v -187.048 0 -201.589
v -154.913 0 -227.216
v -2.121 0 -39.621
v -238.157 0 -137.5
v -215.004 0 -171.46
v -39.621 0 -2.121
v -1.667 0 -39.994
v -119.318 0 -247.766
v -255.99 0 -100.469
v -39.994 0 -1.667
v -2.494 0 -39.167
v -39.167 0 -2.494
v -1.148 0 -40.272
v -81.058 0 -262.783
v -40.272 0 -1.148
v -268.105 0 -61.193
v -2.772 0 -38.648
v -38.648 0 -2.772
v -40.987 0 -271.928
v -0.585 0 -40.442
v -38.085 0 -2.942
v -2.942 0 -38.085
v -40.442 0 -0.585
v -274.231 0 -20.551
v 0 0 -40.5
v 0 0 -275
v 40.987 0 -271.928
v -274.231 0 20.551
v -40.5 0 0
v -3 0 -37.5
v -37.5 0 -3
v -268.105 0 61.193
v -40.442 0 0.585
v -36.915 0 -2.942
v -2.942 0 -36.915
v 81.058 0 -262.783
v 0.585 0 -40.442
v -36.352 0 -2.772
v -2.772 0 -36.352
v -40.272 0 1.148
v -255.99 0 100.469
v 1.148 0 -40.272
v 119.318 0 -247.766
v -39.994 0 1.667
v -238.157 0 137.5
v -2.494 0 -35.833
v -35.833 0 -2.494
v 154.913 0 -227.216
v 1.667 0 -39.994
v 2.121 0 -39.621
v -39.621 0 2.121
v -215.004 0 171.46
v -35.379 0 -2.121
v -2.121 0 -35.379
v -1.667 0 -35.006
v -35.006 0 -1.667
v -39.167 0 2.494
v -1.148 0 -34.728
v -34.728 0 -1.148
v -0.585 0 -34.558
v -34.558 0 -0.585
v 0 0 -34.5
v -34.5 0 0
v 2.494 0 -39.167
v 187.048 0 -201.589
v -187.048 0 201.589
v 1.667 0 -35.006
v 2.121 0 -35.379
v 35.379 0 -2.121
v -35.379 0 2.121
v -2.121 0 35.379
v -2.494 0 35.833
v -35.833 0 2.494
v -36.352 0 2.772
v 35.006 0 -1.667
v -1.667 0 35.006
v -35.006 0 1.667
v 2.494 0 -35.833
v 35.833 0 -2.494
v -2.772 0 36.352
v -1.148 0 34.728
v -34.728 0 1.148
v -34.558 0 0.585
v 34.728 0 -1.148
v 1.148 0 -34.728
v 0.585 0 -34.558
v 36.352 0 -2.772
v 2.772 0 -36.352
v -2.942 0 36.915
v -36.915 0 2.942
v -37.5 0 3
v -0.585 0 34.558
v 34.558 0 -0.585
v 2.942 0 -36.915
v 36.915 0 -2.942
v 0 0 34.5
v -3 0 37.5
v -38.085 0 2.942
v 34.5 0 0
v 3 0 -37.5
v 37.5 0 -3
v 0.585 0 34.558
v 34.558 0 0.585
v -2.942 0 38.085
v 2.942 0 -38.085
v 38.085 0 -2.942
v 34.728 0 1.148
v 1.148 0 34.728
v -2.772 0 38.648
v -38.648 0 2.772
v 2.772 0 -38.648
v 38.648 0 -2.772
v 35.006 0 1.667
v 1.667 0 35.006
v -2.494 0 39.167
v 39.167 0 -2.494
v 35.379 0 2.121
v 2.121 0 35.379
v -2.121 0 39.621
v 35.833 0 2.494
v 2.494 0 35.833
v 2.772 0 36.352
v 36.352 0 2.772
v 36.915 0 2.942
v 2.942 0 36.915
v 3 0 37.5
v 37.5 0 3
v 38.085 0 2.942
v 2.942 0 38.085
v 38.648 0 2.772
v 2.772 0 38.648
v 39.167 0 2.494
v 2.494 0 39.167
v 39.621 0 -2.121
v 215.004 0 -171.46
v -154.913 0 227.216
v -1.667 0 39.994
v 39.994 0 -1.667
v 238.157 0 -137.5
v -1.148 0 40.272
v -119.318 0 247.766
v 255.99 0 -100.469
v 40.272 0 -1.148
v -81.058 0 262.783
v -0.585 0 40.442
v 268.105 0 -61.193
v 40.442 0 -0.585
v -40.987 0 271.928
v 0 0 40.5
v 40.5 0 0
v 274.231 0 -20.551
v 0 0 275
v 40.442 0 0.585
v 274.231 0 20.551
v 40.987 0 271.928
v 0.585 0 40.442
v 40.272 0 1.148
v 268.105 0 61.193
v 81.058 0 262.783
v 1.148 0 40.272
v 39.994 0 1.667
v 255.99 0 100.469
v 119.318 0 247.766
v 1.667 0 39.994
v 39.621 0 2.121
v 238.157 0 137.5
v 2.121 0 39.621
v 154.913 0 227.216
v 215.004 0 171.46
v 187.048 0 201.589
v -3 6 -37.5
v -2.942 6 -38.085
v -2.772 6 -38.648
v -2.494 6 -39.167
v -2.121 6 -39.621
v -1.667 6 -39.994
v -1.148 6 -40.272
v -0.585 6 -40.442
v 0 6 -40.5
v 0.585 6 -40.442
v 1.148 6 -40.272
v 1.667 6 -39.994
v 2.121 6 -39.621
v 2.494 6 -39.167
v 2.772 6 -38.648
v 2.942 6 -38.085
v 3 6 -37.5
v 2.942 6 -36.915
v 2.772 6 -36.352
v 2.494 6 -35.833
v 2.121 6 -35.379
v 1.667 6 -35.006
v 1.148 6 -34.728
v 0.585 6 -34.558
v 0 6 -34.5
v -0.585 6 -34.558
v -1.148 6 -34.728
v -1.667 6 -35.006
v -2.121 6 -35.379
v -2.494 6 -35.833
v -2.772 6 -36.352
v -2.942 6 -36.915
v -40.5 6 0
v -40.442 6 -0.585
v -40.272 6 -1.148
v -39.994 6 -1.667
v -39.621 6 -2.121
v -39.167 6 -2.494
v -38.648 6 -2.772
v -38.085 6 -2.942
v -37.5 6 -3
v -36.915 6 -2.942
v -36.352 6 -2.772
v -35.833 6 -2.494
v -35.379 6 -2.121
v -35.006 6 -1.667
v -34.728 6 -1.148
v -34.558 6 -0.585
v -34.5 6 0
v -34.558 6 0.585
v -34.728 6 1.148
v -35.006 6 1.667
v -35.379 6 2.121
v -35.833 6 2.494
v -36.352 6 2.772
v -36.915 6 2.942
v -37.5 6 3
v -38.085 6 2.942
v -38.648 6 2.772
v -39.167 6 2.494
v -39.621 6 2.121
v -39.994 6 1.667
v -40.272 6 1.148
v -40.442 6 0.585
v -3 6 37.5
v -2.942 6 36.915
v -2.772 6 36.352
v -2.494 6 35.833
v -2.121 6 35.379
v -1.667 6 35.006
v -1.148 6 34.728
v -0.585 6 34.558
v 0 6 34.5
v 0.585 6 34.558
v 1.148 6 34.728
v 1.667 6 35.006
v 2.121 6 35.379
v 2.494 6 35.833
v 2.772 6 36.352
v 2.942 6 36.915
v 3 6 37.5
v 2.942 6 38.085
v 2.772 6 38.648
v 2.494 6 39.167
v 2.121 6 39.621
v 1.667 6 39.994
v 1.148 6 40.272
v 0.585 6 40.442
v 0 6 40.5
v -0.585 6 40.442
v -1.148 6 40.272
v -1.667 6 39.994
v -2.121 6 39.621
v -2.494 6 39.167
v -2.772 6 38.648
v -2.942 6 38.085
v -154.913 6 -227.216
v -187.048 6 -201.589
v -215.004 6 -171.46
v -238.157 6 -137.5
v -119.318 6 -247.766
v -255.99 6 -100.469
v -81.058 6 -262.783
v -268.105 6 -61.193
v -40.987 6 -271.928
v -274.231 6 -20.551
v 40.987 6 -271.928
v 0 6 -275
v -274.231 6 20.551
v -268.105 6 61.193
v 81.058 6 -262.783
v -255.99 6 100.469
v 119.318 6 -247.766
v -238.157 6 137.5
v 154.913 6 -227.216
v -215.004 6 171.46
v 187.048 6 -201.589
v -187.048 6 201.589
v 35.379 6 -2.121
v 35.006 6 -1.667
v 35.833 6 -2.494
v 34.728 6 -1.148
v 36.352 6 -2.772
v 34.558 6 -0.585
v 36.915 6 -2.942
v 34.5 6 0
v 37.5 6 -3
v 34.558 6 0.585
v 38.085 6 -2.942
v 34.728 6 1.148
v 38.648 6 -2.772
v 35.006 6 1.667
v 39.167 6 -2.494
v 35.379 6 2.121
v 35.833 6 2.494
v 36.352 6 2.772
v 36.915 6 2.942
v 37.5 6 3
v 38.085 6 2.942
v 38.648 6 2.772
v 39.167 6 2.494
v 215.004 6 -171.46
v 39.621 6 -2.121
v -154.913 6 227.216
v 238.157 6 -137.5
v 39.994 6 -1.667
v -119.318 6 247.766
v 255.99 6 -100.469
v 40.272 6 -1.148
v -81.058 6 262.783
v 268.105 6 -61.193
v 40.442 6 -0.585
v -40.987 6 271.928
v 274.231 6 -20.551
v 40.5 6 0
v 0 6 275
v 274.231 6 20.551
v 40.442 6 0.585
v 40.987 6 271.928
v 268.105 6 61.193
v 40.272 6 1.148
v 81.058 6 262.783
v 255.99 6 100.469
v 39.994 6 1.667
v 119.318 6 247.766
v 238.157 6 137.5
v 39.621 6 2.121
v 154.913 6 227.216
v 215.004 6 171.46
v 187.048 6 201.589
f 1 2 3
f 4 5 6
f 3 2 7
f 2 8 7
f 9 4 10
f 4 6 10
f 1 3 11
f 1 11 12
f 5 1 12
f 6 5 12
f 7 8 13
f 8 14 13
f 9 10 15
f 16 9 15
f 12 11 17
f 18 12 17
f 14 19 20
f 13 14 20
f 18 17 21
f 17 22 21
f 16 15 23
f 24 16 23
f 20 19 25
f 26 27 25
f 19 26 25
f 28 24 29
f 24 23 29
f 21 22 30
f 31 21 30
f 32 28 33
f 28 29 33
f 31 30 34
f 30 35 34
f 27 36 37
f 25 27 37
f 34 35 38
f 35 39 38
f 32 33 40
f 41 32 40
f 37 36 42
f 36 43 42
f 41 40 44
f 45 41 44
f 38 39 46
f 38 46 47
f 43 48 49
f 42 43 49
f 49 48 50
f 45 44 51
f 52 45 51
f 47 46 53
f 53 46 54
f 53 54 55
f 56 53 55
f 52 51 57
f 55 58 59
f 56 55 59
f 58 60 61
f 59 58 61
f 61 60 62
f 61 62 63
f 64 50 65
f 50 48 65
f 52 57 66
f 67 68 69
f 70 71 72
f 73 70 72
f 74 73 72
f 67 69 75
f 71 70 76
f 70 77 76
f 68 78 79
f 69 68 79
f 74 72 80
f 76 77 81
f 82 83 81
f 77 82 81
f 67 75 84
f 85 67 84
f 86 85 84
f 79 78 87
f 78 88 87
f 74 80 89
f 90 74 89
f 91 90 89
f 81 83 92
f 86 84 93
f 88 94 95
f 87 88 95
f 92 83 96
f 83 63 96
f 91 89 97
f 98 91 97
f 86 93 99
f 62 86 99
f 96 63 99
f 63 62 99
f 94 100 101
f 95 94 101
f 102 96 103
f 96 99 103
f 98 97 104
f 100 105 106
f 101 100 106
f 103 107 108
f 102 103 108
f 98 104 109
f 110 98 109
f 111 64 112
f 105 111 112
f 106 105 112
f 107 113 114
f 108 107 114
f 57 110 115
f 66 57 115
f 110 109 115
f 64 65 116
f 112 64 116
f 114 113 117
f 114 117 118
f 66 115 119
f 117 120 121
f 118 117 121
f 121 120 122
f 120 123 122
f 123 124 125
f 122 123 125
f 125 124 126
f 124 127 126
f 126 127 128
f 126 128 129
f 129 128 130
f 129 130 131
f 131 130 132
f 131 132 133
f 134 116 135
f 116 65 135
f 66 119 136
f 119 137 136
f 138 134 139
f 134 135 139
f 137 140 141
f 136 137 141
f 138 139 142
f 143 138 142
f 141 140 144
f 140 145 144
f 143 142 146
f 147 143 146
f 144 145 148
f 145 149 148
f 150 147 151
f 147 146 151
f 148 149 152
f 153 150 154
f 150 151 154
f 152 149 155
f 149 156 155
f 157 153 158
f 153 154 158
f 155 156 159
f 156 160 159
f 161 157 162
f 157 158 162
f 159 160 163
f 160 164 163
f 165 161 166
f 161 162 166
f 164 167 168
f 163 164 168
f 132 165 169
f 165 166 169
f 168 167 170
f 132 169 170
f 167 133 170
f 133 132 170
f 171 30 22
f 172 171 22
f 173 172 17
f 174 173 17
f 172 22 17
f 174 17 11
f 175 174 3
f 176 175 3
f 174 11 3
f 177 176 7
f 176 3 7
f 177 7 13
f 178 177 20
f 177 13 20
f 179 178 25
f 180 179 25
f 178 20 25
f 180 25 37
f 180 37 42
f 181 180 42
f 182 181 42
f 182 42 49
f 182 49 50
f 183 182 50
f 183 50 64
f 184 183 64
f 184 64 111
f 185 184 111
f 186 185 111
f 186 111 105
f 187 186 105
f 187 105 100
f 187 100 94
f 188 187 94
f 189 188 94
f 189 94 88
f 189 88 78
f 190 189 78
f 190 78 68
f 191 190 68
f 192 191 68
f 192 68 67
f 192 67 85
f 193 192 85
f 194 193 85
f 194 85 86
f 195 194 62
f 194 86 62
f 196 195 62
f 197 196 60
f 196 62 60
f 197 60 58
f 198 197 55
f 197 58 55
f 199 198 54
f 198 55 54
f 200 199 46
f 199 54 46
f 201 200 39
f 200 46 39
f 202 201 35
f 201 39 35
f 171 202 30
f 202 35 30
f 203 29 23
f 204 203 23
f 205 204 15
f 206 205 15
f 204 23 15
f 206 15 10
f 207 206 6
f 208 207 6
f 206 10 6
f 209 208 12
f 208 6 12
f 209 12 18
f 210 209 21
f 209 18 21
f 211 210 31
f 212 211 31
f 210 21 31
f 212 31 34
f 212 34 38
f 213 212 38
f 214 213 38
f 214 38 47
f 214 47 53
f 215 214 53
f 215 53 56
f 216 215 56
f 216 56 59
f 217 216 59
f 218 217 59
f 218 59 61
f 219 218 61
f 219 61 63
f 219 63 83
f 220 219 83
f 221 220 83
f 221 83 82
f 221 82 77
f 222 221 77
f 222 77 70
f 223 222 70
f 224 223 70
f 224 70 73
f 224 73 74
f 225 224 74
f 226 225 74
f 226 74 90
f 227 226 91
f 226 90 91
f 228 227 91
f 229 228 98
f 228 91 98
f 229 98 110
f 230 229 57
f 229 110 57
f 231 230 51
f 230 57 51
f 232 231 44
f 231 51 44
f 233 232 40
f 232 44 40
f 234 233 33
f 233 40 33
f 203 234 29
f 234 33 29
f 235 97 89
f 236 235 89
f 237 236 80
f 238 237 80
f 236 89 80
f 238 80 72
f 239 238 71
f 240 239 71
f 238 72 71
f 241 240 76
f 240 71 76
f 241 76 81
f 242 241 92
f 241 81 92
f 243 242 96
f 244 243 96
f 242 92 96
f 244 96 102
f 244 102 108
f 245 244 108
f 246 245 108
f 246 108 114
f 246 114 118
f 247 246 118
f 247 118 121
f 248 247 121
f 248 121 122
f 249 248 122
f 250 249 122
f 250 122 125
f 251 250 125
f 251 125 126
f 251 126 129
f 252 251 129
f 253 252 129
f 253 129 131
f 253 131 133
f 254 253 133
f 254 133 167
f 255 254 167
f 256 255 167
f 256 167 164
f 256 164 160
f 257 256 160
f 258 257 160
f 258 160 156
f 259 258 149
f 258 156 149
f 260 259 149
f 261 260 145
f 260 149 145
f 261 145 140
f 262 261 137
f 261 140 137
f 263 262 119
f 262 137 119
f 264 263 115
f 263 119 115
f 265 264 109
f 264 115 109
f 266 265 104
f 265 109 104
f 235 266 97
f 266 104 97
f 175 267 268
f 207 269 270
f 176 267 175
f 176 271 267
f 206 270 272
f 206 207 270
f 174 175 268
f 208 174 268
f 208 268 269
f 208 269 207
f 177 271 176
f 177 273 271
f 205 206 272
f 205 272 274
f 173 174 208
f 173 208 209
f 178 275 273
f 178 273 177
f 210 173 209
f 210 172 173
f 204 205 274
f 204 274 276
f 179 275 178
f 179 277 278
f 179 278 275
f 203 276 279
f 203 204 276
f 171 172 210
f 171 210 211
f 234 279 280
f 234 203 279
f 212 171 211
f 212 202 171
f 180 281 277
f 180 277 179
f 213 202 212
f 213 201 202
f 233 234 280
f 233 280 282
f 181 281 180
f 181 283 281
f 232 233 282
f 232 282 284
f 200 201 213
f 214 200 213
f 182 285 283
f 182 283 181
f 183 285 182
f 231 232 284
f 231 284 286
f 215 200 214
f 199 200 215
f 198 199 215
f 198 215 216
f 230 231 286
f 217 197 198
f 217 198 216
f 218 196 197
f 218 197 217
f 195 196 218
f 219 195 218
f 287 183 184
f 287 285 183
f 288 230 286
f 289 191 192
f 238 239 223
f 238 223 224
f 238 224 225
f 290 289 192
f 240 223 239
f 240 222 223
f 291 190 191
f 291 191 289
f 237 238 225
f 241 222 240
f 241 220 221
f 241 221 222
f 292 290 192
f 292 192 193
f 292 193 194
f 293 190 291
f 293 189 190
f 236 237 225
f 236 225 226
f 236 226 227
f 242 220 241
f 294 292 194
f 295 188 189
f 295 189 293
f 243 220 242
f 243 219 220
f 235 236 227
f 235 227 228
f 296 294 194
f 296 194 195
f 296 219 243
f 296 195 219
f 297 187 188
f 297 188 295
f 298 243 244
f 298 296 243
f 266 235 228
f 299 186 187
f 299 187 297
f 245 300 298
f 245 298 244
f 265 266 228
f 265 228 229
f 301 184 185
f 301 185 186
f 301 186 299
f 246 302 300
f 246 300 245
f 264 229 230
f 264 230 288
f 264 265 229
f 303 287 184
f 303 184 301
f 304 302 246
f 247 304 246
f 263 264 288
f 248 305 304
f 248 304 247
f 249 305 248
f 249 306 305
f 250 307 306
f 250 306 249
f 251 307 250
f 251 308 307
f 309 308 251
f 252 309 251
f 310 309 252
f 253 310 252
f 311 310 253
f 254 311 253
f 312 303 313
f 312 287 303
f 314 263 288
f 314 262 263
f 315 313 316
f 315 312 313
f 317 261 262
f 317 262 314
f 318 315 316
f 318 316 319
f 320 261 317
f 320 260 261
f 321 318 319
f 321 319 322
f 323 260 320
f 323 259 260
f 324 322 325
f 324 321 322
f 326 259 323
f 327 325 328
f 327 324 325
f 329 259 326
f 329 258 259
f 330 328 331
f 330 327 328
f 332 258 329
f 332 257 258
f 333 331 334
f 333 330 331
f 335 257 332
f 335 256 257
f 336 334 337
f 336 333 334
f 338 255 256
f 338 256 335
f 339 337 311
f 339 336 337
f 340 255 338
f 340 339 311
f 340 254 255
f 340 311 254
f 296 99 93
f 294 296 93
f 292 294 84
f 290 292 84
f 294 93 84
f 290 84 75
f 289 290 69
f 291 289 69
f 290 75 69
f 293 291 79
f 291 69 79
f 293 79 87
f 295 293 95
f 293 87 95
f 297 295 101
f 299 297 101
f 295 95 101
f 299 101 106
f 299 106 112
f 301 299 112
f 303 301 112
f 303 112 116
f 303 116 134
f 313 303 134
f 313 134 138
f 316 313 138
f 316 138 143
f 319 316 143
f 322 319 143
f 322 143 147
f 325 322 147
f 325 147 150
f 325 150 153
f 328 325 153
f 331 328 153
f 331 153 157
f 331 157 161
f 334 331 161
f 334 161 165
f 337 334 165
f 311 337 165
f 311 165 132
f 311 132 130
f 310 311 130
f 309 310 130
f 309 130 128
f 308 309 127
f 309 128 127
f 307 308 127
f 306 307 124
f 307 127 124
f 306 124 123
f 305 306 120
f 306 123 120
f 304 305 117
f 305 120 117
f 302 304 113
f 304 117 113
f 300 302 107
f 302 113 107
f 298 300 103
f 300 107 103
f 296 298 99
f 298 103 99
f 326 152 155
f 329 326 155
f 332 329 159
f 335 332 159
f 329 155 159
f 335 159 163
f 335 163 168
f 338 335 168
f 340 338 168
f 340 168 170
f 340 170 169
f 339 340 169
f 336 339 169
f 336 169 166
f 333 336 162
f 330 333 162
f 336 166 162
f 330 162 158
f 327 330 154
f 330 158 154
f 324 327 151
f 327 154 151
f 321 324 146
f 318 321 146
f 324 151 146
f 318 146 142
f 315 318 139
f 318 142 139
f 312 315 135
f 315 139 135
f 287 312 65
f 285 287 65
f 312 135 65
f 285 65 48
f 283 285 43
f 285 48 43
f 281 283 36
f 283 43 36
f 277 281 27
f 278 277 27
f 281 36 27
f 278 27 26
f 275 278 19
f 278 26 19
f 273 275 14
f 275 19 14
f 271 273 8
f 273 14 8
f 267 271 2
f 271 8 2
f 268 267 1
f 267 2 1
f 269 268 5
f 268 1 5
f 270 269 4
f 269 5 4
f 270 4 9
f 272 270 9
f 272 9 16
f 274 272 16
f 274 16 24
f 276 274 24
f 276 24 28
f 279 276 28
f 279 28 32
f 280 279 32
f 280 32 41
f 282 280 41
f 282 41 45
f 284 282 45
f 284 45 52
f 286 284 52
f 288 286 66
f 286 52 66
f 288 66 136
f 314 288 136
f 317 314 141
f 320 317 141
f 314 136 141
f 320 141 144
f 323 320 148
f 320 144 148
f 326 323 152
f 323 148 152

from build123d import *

# Parameters (mm, degrees)
ESBO_O1_R                  = 275
RESSALTO_EXTRUS_O1_DEPTH   = 6
FURO_DE_DI_METRO_6_0_6_1_D = 6


with BuildPart() as part:
    # Esboço1 → Ressalto-extrusão1 (new body)
    with BuildSketch(Plane(origin=(0, 0, 0), x_dir=(1, 0, 0), z_dir=(0, 1, 0))):
        with Locations(Location((0, 0, 0), (0, 0, 270))):
            Circle(ESBO_O1_R)
    extrude(amount=RESSALTO_EXTRUS_O1_DEPTH)

    # Furo de diâmetro Ø6.0 (6)1 (through all)
    with Locations(Plane(origin=(0, 6, 0), x_dir=(1, 0, 0), z_dir=(0, 1, 0))):
        with Locations((0, 37.5), (37.5, 0), (0, -37.5), (-37.5, 0)):
            Hole(FURO_DE_DI_METRO_6_0_6_1_D / 2)


solid = part.part
